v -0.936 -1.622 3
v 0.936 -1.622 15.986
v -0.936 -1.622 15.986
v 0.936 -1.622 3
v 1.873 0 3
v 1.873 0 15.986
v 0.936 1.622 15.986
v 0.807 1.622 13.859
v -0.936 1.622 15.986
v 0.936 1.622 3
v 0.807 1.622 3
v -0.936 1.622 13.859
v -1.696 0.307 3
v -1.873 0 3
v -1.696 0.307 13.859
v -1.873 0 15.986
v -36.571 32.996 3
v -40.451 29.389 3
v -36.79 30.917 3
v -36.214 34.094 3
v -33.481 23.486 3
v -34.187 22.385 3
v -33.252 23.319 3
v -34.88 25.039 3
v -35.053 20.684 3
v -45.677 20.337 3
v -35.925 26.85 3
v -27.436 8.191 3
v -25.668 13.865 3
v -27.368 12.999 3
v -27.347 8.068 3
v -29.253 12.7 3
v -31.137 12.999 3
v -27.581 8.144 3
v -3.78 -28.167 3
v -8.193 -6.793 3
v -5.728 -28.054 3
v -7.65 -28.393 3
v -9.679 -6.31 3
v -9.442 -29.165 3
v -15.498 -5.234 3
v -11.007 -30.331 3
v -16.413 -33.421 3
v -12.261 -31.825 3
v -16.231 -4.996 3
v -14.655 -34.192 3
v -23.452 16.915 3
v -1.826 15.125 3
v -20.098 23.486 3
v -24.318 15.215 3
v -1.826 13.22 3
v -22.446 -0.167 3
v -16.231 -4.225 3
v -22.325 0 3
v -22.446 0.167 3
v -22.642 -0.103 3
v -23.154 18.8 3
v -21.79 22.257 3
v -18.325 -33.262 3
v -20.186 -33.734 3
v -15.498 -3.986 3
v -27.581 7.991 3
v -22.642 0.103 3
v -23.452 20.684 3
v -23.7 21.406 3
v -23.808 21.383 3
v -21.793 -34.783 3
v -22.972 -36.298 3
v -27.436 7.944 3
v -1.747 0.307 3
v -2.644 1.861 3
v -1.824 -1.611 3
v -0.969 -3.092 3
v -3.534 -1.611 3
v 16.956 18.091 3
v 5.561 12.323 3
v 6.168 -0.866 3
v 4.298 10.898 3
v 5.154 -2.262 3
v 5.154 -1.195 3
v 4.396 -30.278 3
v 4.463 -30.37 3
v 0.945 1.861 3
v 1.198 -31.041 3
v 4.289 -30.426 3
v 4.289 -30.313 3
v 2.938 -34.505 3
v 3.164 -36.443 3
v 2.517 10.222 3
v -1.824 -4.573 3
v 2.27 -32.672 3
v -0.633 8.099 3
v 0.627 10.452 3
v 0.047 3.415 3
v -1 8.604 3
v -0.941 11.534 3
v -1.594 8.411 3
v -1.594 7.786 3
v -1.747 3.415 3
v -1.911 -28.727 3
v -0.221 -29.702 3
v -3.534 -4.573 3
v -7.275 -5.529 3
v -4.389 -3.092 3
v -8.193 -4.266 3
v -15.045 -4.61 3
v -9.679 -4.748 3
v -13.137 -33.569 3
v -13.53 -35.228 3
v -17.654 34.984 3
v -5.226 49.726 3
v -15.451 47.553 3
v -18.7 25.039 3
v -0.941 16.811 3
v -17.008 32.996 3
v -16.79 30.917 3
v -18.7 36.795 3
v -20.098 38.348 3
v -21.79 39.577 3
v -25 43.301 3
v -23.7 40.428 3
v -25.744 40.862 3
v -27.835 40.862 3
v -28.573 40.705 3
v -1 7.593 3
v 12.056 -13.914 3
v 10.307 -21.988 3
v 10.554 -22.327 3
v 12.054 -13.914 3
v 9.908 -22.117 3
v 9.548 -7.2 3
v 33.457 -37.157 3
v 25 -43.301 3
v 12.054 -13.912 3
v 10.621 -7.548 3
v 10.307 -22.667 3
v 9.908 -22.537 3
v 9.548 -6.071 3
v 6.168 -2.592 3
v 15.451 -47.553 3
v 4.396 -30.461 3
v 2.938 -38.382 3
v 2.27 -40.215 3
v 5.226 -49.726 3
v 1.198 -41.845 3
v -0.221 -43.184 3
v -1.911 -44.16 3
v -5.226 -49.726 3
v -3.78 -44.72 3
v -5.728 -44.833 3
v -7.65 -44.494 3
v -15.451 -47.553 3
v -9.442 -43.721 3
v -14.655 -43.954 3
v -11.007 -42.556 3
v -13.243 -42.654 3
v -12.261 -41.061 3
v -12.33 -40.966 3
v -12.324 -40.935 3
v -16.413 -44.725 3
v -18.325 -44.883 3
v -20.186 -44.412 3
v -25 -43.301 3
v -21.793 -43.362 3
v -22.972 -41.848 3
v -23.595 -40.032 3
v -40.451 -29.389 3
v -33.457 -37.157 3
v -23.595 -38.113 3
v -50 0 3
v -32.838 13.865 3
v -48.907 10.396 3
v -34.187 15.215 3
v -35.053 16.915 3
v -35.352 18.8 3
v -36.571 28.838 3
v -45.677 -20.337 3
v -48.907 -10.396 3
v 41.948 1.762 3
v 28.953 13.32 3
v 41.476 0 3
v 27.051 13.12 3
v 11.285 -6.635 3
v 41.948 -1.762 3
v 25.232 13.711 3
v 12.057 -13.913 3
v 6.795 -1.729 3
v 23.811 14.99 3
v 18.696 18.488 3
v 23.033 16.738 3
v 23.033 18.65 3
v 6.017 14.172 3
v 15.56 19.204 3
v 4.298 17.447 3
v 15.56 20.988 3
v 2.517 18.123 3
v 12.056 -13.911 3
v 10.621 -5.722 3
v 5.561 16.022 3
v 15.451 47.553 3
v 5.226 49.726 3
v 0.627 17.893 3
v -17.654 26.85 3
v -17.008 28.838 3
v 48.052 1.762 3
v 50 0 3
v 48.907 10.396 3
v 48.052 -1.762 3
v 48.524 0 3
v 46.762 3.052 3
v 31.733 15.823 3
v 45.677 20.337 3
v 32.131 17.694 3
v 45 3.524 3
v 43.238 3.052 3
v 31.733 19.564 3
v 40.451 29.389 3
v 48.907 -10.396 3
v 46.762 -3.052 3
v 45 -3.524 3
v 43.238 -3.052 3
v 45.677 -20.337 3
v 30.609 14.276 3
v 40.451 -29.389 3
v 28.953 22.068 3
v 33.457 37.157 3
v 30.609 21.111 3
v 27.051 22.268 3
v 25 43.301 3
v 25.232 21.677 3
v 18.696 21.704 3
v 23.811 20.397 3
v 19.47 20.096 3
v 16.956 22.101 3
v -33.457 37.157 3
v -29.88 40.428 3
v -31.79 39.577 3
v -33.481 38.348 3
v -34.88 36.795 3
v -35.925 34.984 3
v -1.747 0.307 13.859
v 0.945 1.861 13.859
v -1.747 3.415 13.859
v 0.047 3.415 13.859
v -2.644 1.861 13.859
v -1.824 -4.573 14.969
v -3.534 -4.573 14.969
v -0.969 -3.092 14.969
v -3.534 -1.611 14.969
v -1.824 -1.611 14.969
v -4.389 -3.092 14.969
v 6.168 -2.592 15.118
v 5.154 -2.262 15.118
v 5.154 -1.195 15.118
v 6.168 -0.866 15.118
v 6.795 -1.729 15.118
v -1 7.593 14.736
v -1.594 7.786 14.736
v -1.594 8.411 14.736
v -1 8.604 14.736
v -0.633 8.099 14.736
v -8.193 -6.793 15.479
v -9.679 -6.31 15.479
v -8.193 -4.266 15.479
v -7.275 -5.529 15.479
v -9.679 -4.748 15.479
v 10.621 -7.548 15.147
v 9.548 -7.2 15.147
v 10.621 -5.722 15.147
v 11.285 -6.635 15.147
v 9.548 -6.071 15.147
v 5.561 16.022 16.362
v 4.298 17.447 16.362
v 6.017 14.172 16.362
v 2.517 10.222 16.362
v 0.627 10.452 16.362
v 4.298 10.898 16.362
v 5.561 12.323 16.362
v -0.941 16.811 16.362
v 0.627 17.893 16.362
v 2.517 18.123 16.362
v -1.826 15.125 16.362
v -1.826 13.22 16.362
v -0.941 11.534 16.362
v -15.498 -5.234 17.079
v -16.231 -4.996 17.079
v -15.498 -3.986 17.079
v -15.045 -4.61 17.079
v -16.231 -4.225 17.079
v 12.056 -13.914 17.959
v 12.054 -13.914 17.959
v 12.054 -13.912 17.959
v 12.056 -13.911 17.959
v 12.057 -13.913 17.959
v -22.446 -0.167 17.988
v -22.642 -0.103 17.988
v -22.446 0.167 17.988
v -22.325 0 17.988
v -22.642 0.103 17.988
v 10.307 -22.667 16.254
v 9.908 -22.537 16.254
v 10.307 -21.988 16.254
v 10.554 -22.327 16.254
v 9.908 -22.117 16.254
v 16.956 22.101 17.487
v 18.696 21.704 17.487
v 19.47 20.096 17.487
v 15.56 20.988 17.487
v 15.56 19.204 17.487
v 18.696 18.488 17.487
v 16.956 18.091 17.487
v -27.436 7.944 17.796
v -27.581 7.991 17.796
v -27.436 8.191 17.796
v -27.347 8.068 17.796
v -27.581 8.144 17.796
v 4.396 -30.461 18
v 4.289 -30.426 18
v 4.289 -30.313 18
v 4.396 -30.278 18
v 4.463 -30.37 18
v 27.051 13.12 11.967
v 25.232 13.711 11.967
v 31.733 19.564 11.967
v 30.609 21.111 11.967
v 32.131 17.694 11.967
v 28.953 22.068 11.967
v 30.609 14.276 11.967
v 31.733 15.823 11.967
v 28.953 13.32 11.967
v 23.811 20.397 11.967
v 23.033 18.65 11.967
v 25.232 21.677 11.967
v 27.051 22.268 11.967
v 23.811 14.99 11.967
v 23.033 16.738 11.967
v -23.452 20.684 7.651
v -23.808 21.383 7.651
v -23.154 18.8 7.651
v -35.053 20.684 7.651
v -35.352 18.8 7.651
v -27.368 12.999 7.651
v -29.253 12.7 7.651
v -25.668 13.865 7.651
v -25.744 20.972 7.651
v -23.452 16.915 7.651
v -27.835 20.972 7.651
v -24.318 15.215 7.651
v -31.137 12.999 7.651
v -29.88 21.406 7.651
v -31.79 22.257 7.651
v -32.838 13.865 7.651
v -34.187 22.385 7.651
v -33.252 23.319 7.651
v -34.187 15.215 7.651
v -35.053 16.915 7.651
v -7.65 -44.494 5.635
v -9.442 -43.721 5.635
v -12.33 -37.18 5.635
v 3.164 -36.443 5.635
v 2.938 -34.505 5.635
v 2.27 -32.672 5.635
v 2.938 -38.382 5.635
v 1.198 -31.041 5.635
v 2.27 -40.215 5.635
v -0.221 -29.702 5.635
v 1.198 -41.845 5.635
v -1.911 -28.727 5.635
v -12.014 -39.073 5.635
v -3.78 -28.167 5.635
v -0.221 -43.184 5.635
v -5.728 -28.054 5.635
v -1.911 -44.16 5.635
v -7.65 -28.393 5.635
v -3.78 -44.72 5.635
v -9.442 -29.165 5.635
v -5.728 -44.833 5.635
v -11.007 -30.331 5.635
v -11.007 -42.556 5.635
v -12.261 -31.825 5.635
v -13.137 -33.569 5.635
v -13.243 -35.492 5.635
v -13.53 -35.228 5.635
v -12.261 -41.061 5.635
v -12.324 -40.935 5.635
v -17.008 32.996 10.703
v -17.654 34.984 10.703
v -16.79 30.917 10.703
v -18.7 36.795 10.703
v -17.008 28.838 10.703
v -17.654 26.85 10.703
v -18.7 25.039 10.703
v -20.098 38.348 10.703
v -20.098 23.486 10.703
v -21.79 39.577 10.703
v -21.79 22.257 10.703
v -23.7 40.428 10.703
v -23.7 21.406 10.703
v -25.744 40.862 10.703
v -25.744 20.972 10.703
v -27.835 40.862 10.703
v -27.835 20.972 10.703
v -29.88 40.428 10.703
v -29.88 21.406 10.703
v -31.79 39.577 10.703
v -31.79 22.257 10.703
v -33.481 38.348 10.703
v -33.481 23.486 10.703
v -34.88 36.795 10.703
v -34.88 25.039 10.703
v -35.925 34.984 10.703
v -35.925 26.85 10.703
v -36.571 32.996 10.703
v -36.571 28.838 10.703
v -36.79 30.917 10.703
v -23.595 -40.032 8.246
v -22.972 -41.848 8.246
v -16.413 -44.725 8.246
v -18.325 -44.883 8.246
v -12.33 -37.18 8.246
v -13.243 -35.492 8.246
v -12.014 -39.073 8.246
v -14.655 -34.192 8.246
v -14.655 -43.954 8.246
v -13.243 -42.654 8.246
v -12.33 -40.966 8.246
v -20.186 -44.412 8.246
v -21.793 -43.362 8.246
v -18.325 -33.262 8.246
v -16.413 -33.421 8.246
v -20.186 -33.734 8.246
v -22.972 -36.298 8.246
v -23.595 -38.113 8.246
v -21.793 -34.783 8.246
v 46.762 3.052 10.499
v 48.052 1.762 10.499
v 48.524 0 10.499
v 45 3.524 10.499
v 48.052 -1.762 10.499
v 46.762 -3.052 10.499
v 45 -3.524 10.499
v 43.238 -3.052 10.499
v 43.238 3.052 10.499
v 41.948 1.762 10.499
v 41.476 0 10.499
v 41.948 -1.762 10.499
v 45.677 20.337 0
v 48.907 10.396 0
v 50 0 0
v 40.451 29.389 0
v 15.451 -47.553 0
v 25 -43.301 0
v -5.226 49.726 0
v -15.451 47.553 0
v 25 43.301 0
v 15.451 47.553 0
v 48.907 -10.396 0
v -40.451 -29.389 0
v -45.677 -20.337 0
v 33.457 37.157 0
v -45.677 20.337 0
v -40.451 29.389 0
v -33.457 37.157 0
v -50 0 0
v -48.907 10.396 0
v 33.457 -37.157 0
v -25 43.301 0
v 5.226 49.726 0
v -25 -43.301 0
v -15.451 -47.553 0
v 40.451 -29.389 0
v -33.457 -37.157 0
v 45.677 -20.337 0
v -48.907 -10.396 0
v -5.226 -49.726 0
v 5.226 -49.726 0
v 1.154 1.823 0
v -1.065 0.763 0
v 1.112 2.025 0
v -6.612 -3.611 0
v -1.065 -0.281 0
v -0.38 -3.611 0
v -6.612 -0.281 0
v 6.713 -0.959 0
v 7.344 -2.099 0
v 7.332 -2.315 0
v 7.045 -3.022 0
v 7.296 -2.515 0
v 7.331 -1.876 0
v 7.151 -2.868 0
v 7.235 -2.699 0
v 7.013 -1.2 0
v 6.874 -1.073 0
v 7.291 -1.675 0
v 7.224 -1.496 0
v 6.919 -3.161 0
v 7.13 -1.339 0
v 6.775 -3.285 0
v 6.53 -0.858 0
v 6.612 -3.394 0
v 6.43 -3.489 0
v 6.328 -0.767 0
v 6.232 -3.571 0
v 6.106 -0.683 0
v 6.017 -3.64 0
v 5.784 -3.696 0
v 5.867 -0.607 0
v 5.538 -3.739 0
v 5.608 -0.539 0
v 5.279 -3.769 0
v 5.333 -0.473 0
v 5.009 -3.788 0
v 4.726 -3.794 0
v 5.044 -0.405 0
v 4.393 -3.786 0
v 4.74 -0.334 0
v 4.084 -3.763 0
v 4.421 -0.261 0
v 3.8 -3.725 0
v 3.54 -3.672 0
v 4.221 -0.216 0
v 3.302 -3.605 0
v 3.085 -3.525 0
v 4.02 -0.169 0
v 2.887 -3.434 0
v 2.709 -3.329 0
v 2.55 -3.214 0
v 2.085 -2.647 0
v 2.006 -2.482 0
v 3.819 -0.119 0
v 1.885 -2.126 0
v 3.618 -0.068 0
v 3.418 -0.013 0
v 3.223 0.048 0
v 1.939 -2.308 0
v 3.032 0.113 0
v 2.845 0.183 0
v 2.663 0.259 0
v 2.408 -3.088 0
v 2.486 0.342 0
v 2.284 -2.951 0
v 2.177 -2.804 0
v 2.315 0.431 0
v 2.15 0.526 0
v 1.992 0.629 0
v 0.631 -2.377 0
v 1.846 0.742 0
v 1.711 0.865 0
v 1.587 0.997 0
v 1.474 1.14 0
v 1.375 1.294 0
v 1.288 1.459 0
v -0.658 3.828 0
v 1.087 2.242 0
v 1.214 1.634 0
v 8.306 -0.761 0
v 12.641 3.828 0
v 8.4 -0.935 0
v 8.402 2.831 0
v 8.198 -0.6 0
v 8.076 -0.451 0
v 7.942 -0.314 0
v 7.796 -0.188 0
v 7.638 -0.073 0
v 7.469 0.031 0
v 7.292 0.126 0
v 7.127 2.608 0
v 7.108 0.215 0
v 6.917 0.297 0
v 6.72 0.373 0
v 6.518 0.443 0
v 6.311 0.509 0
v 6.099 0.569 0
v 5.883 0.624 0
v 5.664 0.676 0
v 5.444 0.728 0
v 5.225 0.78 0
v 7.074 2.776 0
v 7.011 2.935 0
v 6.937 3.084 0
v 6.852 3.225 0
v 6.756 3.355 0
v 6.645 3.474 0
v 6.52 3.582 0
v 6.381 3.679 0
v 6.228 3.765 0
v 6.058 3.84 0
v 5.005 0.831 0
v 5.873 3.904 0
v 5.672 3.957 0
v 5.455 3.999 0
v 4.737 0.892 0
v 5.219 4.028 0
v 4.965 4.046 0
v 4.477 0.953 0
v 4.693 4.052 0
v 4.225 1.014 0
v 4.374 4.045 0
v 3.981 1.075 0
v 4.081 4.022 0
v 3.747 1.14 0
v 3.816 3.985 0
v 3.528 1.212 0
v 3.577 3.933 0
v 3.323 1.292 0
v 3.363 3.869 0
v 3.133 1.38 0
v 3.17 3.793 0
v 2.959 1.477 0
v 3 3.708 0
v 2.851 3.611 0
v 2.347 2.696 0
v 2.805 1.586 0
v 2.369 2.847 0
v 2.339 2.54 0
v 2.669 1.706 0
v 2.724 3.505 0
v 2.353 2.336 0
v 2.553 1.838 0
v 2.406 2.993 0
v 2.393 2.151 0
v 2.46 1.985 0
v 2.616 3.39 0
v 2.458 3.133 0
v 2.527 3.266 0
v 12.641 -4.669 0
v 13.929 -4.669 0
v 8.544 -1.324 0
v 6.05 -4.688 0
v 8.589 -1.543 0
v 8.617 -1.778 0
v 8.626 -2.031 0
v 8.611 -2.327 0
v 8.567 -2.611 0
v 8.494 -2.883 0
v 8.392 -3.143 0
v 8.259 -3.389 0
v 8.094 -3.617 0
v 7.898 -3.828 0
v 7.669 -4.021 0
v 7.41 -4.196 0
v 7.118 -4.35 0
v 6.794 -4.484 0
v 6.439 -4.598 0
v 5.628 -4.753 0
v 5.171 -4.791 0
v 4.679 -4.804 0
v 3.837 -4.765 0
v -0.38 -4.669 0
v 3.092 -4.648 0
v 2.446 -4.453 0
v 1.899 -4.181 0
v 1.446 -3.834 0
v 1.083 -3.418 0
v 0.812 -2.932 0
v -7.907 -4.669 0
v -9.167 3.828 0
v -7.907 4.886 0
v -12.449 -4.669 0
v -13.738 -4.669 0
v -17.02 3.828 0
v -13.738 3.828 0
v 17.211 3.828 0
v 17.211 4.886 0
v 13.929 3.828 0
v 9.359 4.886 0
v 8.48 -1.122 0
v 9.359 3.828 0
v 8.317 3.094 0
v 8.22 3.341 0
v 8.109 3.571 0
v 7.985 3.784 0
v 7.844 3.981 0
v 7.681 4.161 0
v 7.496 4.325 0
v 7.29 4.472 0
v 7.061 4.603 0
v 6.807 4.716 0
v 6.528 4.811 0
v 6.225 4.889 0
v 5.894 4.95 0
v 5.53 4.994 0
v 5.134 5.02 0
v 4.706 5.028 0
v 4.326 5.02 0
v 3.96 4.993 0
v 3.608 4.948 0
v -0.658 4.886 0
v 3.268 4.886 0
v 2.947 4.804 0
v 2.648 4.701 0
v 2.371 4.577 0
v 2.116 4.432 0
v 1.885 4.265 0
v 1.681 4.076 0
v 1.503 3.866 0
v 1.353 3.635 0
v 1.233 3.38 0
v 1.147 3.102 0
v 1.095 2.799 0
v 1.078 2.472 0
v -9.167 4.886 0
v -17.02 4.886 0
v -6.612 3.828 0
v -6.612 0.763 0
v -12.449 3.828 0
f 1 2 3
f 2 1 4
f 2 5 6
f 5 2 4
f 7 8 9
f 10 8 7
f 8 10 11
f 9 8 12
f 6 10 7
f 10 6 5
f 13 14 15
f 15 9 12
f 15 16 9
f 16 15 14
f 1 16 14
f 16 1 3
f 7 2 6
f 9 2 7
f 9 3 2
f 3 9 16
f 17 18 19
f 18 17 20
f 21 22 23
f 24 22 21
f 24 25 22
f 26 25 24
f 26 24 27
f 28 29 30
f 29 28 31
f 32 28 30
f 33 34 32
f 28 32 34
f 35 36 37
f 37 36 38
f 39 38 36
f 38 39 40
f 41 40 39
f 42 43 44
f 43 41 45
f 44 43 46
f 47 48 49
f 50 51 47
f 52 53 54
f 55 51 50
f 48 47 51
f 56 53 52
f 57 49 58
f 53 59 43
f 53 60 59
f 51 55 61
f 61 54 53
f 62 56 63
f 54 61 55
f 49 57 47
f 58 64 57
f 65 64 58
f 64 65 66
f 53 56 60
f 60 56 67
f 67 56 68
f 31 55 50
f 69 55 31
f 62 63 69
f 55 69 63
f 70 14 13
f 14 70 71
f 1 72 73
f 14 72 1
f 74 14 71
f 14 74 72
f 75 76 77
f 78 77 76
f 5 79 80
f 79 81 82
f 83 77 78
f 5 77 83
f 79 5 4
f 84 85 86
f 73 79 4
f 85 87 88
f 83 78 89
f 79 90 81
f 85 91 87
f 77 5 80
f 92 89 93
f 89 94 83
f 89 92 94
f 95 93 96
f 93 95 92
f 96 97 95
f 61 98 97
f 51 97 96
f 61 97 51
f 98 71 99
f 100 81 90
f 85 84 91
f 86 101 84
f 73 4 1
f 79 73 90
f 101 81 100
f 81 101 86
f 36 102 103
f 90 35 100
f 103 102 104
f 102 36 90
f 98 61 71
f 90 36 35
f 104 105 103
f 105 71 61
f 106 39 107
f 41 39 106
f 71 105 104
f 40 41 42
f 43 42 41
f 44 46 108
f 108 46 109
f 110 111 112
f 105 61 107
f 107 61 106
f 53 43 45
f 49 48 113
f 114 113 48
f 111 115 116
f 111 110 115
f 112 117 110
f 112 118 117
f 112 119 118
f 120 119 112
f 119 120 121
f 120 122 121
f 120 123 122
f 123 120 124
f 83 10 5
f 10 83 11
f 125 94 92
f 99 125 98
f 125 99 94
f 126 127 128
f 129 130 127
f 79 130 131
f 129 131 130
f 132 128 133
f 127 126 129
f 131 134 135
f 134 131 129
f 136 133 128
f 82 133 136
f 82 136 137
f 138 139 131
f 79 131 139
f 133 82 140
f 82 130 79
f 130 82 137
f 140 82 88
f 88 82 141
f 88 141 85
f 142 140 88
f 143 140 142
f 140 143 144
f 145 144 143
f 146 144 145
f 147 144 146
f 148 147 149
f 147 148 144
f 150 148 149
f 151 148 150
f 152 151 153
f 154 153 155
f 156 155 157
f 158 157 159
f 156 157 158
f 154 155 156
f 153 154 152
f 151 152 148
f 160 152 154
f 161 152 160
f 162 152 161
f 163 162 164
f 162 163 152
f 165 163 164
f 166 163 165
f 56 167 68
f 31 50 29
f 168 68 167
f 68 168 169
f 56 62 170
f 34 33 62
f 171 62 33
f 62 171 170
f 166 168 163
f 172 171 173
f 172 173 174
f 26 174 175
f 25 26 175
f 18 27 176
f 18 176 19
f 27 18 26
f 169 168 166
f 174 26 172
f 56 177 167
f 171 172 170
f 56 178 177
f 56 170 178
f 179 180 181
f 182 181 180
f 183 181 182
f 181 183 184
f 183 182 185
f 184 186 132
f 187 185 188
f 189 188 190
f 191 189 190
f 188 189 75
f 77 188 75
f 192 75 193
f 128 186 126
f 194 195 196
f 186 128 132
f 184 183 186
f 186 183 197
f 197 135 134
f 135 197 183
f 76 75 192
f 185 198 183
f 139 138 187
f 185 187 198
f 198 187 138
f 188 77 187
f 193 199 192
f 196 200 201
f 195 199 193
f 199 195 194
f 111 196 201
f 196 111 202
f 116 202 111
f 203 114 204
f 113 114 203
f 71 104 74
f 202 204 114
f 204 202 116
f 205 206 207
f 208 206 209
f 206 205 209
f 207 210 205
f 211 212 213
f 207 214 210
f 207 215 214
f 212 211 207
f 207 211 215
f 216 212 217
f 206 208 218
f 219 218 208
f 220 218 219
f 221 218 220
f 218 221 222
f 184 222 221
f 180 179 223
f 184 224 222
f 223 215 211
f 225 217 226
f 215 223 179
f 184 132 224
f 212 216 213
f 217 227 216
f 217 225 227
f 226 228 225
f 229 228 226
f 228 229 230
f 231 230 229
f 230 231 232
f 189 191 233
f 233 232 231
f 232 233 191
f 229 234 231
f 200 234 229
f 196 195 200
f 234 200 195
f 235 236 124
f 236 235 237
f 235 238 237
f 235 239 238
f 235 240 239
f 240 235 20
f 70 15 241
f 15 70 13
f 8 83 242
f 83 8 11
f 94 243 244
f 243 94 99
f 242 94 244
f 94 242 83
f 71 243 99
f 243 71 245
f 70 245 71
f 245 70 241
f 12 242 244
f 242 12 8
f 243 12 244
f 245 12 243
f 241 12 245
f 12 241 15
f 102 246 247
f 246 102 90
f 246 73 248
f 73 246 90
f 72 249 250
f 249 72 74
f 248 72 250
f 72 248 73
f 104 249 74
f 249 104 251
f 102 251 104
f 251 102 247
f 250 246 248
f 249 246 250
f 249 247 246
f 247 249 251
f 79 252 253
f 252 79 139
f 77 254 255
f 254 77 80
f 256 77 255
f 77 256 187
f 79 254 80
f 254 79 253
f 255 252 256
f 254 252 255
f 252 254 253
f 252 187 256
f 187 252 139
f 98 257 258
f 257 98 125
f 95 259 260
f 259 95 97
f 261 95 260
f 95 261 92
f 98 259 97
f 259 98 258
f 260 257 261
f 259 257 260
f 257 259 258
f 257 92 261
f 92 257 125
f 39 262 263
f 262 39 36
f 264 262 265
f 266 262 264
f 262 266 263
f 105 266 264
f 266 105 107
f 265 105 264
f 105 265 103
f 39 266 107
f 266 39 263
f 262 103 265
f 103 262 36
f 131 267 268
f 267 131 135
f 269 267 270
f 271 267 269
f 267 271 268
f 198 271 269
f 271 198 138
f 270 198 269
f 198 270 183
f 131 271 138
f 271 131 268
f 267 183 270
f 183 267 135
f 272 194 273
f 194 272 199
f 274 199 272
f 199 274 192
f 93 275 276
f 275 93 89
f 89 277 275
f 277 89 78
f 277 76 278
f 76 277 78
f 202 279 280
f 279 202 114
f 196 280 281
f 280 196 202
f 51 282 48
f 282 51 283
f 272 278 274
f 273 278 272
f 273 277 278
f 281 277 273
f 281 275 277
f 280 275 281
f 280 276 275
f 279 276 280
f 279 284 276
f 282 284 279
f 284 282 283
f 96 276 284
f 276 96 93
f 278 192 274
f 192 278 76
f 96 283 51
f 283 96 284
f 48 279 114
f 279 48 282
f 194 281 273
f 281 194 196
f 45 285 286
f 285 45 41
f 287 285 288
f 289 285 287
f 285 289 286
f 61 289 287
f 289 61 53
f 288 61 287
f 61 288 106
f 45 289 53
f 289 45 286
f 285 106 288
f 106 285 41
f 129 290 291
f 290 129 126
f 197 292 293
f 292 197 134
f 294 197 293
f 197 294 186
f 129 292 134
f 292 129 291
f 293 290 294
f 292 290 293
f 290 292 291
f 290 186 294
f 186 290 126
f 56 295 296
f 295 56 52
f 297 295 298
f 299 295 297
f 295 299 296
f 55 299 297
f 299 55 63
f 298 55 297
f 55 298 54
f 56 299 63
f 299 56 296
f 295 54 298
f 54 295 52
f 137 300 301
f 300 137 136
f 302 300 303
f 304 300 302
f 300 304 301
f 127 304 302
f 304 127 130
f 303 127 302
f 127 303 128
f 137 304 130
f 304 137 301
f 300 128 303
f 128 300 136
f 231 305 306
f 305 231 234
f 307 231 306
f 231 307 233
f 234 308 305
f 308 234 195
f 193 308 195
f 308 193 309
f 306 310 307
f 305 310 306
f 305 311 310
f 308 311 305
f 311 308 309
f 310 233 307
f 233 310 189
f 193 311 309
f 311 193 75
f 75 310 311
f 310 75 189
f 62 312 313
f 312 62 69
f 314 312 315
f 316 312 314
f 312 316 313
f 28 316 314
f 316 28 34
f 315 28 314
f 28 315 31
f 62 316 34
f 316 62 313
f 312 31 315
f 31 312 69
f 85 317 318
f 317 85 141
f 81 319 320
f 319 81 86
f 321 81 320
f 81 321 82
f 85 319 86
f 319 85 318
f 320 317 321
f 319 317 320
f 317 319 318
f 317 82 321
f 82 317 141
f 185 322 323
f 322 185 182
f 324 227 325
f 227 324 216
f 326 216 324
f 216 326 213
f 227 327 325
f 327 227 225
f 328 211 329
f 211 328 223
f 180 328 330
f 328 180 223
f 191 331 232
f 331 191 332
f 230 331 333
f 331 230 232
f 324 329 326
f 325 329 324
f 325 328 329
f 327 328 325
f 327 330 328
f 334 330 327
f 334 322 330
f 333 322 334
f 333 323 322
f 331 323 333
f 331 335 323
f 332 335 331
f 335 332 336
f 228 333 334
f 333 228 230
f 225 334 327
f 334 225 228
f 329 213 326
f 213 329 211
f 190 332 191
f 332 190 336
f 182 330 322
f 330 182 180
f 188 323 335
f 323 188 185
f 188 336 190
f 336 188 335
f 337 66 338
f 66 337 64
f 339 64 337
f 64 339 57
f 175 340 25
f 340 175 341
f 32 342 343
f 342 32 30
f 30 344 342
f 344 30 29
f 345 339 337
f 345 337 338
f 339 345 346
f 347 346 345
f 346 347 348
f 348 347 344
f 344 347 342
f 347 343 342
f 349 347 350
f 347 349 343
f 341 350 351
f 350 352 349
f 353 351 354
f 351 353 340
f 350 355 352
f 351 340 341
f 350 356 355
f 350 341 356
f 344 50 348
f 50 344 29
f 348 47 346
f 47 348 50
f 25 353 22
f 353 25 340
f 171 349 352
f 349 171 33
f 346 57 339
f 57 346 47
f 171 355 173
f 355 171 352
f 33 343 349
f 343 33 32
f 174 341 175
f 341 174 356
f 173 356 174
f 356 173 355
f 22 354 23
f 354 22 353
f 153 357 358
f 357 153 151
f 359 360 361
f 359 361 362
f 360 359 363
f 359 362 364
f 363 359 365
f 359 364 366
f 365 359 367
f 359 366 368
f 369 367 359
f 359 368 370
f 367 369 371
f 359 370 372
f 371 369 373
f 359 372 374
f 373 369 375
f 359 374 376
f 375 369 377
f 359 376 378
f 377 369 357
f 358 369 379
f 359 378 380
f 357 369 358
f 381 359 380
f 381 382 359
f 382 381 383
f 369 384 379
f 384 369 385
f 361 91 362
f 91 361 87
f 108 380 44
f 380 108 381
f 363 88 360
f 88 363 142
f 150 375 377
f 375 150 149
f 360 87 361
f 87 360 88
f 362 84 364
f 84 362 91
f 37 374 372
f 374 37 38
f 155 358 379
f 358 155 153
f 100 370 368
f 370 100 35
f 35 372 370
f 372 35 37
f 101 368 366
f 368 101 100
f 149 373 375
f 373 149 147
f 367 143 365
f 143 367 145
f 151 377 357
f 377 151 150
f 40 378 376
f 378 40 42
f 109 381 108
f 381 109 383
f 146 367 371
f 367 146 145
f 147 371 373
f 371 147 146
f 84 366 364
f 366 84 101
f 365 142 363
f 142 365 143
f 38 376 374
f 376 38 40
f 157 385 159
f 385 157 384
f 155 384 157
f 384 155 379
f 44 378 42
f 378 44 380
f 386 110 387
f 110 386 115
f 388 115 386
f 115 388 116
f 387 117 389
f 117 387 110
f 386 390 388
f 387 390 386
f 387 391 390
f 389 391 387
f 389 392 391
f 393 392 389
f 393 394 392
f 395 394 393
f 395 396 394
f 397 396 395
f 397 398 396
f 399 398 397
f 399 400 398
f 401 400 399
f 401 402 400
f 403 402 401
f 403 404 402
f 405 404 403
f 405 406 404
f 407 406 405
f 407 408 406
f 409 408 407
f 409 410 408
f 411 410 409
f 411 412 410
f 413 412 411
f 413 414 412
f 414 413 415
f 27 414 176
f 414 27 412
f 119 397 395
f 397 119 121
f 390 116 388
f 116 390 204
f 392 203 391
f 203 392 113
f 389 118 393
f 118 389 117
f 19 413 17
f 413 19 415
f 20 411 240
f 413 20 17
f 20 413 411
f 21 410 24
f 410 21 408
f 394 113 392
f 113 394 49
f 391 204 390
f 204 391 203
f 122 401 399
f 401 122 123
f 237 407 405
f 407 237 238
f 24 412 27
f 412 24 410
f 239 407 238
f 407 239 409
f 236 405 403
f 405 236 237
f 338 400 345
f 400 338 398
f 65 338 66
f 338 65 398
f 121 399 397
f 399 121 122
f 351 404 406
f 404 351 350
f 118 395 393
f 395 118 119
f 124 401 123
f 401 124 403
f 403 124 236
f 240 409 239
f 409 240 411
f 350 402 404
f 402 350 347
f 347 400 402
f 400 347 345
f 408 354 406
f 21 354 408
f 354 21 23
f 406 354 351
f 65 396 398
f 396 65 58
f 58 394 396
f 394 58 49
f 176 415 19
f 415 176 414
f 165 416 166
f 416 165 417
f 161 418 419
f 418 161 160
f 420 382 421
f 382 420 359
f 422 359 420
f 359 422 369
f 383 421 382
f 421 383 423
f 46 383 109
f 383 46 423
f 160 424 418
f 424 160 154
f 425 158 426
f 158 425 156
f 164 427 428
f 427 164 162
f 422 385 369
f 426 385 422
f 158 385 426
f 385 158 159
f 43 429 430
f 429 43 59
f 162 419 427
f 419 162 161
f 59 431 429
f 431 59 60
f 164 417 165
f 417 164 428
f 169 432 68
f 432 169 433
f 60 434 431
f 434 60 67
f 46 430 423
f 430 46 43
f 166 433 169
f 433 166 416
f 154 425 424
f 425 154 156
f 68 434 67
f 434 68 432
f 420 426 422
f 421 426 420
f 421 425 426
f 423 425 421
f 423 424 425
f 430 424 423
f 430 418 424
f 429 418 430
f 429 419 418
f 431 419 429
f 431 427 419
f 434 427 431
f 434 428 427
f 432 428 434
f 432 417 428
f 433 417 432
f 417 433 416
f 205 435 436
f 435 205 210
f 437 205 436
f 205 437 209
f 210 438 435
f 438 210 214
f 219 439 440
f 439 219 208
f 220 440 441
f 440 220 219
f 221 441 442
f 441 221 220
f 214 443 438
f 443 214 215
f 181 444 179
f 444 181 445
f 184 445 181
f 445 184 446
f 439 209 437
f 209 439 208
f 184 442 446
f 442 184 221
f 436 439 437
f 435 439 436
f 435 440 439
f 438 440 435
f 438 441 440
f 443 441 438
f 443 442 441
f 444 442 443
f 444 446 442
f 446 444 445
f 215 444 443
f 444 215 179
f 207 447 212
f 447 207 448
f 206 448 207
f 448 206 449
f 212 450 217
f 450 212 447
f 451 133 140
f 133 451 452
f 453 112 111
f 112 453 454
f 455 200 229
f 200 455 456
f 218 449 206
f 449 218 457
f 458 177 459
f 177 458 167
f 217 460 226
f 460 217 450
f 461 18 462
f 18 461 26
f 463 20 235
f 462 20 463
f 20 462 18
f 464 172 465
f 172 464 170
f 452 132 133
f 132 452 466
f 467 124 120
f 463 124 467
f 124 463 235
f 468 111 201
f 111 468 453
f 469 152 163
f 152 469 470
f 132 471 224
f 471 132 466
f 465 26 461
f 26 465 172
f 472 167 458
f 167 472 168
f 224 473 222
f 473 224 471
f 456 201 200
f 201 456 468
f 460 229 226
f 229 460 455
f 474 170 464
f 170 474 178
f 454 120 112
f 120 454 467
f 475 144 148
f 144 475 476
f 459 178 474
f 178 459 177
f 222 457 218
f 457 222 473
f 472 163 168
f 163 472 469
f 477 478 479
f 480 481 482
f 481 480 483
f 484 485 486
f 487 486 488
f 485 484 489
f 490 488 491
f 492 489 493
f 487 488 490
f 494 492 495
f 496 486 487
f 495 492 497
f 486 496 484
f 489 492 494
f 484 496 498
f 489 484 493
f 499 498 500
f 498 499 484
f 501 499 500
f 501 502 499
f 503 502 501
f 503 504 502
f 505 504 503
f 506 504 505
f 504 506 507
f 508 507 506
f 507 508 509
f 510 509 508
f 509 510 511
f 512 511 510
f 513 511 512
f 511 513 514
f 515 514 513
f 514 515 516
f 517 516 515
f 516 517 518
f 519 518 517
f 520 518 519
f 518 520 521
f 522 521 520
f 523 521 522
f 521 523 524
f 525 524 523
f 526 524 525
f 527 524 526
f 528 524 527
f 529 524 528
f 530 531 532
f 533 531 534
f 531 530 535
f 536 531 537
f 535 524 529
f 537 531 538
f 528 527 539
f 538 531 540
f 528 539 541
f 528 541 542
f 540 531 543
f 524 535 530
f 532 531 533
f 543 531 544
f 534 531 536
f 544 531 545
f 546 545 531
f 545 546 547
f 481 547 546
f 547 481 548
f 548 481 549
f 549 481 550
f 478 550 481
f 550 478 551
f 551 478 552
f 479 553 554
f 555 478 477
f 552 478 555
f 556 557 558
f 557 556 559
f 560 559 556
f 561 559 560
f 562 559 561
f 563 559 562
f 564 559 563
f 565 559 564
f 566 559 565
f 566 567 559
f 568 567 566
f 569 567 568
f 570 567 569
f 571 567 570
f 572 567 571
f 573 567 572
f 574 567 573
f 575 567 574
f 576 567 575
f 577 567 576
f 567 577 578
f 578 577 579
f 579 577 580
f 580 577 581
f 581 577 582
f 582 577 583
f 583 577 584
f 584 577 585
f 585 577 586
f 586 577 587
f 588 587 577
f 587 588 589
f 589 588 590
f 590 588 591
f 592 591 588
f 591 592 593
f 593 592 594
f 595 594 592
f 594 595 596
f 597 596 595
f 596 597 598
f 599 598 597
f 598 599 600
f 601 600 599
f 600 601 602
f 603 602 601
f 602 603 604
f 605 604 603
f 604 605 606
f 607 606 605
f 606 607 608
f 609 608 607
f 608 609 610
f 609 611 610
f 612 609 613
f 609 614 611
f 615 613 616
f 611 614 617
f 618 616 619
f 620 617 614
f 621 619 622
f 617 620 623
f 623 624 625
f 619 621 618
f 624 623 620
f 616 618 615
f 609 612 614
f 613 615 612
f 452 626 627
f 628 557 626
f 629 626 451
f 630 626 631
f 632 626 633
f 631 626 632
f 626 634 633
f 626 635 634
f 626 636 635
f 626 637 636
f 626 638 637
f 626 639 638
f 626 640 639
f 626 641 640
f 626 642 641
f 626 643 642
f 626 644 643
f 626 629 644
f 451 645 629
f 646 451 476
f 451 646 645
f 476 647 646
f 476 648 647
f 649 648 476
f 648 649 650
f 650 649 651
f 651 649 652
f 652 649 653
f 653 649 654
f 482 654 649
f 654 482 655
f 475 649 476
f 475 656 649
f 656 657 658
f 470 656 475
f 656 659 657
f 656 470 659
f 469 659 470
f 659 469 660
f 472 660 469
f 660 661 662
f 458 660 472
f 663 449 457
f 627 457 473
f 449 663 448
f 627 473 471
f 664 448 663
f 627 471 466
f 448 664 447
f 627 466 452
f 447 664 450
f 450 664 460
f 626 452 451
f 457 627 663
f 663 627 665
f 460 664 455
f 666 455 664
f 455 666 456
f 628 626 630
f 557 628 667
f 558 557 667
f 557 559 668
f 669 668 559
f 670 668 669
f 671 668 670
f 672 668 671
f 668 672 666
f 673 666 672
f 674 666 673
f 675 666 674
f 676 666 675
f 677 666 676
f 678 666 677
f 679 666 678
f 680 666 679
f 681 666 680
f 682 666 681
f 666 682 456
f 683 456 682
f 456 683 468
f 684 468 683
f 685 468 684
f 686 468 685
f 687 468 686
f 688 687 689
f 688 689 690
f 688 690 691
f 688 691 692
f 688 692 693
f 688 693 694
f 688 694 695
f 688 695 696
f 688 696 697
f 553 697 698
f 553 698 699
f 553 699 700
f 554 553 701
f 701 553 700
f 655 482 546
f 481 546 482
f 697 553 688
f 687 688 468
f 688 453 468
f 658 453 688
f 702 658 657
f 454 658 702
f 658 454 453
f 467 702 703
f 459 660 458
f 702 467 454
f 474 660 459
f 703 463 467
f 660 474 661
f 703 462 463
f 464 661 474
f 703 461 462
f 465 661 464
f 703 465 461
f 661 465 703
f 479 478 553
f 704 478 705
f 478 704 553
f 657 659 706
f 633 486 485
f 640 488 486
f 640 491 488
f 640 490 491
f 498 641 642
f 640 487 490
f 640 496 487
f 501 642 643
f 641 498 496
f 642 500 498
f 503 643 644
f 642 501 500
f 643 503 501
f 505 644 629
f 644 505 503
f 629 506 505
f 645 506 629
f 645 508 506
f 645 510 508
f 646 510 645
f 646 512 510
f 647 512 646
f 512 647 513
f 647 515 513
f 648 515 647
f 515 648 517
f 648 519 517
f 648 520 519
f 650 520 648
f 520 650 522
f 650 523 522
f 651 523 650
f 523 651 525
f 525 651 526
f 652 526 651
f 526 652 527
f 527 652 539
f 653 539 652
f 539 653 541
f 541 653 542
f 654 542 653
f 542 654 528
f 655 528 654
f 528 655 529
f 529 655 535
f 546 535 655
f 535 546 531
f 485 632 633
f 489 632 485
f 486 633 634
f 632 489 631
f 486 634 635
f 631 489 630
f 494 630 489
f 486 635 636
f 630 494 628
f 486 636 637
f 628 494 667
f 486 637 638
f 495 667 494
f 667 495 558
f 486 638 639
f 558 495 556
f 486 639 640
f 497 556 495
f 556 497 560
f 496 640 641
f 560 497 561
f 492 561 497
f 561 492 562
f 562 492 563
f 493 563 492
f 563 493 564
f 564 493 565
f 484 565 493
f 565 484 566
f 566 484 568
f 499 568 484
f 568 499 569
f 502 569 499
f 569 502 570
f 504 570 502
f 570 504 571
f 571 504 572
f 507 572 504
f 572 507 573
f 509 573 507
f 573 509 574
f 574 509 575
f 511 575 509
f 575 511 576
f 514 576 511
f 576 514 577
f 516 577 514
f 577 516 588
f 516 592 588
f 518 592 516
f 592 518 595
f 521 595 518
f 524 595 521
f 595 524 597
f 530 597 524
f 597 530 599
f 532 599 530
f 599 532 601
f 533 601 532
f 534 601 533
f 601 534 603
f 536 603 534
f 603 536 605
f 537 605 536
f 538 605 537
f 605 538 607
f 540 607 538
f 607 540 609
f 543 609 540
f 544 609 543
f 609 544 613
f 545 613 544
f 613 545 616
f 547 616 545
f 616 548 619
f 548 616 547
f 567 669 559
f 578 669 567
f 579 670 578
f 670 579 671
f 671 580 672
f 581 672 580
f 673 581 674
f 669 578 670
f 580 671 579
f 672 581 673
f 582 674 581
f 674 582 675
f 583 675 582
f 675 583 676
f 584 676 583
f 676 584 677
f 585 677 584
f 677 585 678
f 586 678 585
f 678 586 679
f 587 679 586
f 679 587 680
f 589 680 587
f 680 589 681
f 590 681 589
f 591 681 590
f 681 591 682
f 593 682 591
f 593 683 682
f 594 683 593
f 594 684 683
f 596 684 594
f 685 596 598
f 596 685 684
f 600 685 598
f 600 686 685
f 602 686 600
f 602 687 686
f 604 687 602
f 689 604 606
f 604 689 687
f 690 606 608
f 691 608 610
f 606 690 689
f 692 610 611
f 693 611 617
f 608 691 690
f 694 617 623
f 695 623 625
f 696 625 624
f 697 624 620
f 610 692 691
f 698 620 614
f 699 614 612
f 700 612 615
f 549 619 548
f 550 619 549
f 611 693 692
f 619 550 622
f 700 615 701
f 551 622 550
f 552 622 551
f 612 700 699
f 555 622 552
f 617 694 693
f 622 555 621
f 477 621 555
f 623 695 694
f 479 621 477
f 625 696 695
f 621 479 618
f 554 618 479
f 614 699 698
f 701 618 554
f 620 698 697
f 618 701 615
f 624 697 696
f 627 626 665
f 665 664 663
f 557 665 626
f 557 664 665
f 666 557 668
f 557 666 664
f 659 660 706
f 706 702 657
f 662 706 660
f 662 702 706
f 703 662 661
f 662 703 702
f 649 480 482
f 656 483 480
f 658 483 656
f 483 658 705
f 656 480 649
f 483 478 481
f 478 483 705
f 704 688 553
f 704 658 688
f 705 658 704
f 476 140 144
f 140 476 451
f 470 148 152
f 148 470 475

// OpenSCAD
// Generated by SolidPython 1.1.3 on 2025-04-12 11:14:56


difference() {
	union() {
		cylinder(center = false, h = 3, r = 50);
		union() {
			translate(v = [0.0, 0.0, 3]) {
				cylinder(center = false, h = 12.986204537140186, r = 1.872969883238689);
			}
			translate(v = [-0.8497125265947675, 1.8606108995887878, 3]) {
				cylinder(center = false, h = 10.858750813041151, r = 1.7943197416390873);
			}
			translate(v = [-2.678975729776167, -3.0917028041765104, 3]) {
				cylinder(center = false, h = 11.969110069021792, r = 1.7102337227155642);
			}
			translate(v = [5.887797792634416, -1.7288134169815006, 3]) {
				cylinder(center = false, h = 12.117738734673768, r = 0.9075780798747147);
			}
			translate(v = [-1.1643941313268753, 8.098539069934905, 3]) {
				cylinder(center = false, h = 11.73596366350858, r = 0.5313353316018563);
			}
			translate(v = [-8.603729313046175, -5.52928108761406, 3]) {
				cylinder(center = false, h = 12.479115885564132, r = 1.3285751064831675);
			}
			translate(v = [10.324475175655405, -6.6351373051368805, 3]) {
				cylinder(center = false, h = 12.146883702949589, r = 0.9602360571414088);
			}
			translate(v = [2.0376897298220564, 14.17244337238608, 3]) {
				cylinder(center = false, h = 13.36215417216846, r = 3.9793089832708373);
			}
			translate(v = [-15.700794113691778, -4.610169111950656, 3]) {
				cylinder(center = false, h = 14.079074144016632, r = 0.655866945730602);
			}
			translate(v = [12.05539078399272, -13.912662618794325, 3]) {
				cylinder(center = false, h = 14.959199712552525, r = 0.001834191735065344);
			}
			translate(v = [8.497125265947703, 18.606108995887862, 3]) {
				cylinder(center = false, h = 14.312220549529846, r = 0.0);
			}
			translate(v = [-22.5, 1.928818708657081e-14, 3]) {
				cylinder(center = false, h = 14.988344680828348, r = 0.17532872050786436);
			}
			translate(v = [10.196550319137206, -22.327330795065453, 3]) {
				cylinder(center = false, h = 13.254321347066153, r = 0.357000409524991);
			}
			translate(v = [17.413342243545074, 20.096068227147327, 3]) {
				cylinder(center = false, h = 14.4870814653892, r = 2.0565091129315185);
			}
			translate(v = [-27.476389698960585, 8.067795945913742, 3]) {
				cylinder(center = false, h = 14.795998562762627, r = 0.1298340956901163);
			}
			translate(v = [4.366477992475729, -30.369521512255897, 3]) {
				cylinder(center = false, h = 15.0, r = 0.0960316094598939);
			}
			translate(v = [27.531933801747773, 17.693699480364966, 3]) {
				cylinder(center = false, h = 8.967360659421583, r = 4.599012337774078);
			}
			translate(v = [-29.252679664356965, 18.799555697887854, 3]) {
				cylinder(center = false, h = 4.65125500350119, r = 6.099174413625576);
			}
			translate(v = [-5.239773590971098, -36.44342581470705, 3]) {
				cylinder(center = false, h = 2.634546822572928, r = 8.403946380239285);
			}
			translate(v = [37.289386020017965, 10.94915164088284, 3]) {
				cylinder(center = false, h = 0.0, r = 5.762256736152519);
			}
			translate(v = [-26.78975729776157, 30.917028041765185, 3]) {
				cylinder(center = false, h = 7.702547301652045, r = 10.0);
			}
			translate(v = [-17.843963058490072, -39.07282889136456, 3]) {
				cylinder(center = false, h = 5.245774113006939, r = 5.830321923993762);
			}
			translate(v = [45.0, -7.715274834628324e-14, 3]) {
				cylinder(center = false, h = 7.498541417516872, r = 3.5239091895006864);
			}
		}
	}
	translate(v = [0, 0, -2]) {
		linear_extrude(height = 2) {
			text(halign = "center", size = 10, text = "TEST", valign = "center");
		}
	}
}
/***********************************************
*********      SolidPython code:      **********
************************************************
 
#!/usr/bin/env python3
"""
Improved 3D Model Generation Module for Crazy Stock Badges Project

This module provides classes and functions for generating 3D models from stock data
using SolidPython to create OpenSCAD files that can be rendered to STL for 3D printing.
"""

import os
import numpy as np
import pandas as pd
from solid import *
from solid.utils import *
import logging
from abc import ABC, abstractmethod
from pathlib import Path
import math

# Configure logging
logging.basicConfig(
    level=logging.INFO,
    format='%(asctime)s - %(name)s - %(levelname)s - %(message)s'
)
logger = logging.getLogger('improved_3d_models')


class StockDataValidator:
    """Validates and preprocesses stock data for 3D model generation."""
    
    @staticmethod
    def validate_data(data):
        """
        Validate that the data contains the required columns.
        
        Args:
            data (pandas.DataFrame): Stock data
            
        Returns:
            bool: True if data is valid, False otherwise
        """
        required_columns = ['Close', 'Volume']
        
        if not isinstance(data, pd.DataFrame):
            logger.error("Data must be a pandas DataFrame")
            return False
        
        for col in required_columns:
            if col not in data.columns:
                logger.error(f"Required column '{col}' not found in data")
                return False
        
        if len(data) < 5:
            logger.error("Data must contain at least 5 rows")
            return False
            
        return True
    
    @staticmethod
    def normalize_data(data, columns=None, new_min=0, new_max=10):
        """
        Normalize specified columns to a new range.
        
        Args:
            data (pandas.DataFrame): Stock data
            columns (list): List of columns to normalize
            new_min (float): Minimum value for normalized data
            new_max (float): Maximum value for normalized data
            
        Returns:
            pandas.DataFrame: Data with normalized columns added
        """
        if columns is None:
            columns = ['Close', 'Volume']
        
        result = data.copy()
        
        for col in columns:
            if col in data.columns:
                norm_col = f'{col}_Normalized'
                min_val = data[col].min()
                max_val = data[col].max()
                
                # Avoid division by zero
                if max_val == min_val:
                    result[norm_col] = new_min
                else:
                    result[norm_col] = (data[col] - min_val) / (max_val - min_val) * (new_max - new_min) + new_min
            else:
                logger.warning(f"Column '{col}' not found in data, skipping normalization")
        
        return result


class Badge3DModel(ABC):
    """Abstract base class for 3D badge models."""
    
    def __init__(self, stock_data, ticker_symbol, params=None):
        """
        Initialize the 3D model.
        
        Args:
            stock_data (pandas.DataFrame): Stock data
            ticker_symbol (str): Stock ticker symbol
            params (dict): Additional parameters for the model
        """
        self.ticker_symbol = ticker_symbol
        self.params = params or {}
        
        # Validate and normalize data
        validator = StockDataValidator()
        if not validator.validate_data(stock_data):
            raise ValueError("Invalid stock data")
        
        # Set default normalization ranges
        height_range = self.params.get('height_range', (0, 15))
        width_range = self.params.get('width_range', (0, 10))
        
        # Normalize data
        self.data = validator.normalize_data(
            stock_data, 
            columns=['Close', 'Volume', 'High', 'Low'],
            new_min=height_range[0],
            new_max=height_range[1]
        )
        
        # Normalize volume separately for width
        self.data['Volume_Width'] = validator.normalize_data(
            stock_data, 
            columns=['Volume'],
            new_min=width_range[0],
            new_max=width_range[1]
        )['Volume_Normalized']
        
        # Initialize model components
        self.base_model = None
        self.feature_model = None
        self.text_model = None
        self.final_model = None
        
        # Model statistics
        self.stats = {
            'num_objects': 0,
            'height_diff': 0,
            'width_diff': 0,
            'depth_diff': 0,
            'size': (0, 0, 0)
        }
    
    @abstractmethod
    def generate_base(self):
        """Generate the base part of the model."""
        pass
    
    @abstractmethod
    def generate_feature(self):
        """Generate the feature part of the model based on stock data."""
        pass
    
    @abstractmethod
    def generate_text(self):
        """Generate text elements for the model."""
        pass
    
    def combine_models(self):
        """
        Combine base, feature, and text models into the final model.
        
        Returns:
            solid.OpenSCADObject: Combined 3D model
        """
        if self.base_model is None:
            self.generate_base()
        
        if self.feature_model is None:
            self.generate_feature()
        
        if self.text_model is None:
            self.generate_text()
        
        # Combine models
        combined = union()(
            self.base_model,
            self.feature_model
        )
        
        # Apply text as a difference (engraving)
        if self.text_model is not None:
            self.final_model = difference()(
                combined,
                self.text_model
            )
        else:
            self.final_model = combined
        
        return self.final_model
    
    def calculate_stats(self):
        """
        Calculate statistics about the model.
        
        Returns:
            dict: Model statistics
        """
        # This is a placeholder - in a real implementation, we would
        # analyze the OpenSCAD model to extract these statistics
        self.stats['num_objects'] = len(self.data)
        self.stats['height_diff'] = self.params.get('height_range', (0, 15))[1]
        self.stats['width_diff'] = self.params.get('width_range', (0, 10))[1]
        self.stats['depth_diff'] = 5  # Example value
        self.stats['size'] = (100, 100, 20)  # Example values
        
        return self.stats
    
    def save_to_file(self, filename=None):
        """
        Save the model to an OpenSCAD file.
        
        Args:
            filename (str): Output filename
            
        Returns:
            str: Path to the saved file
        """
        if self.final_model is None:
            self.combine_models()
        
        if filename is None:
            filename = f"{self.ticker_symbol}_badge.scad"
        
        # Save the model
        scad_render_to_file(self.final_model, filename)
        logger.info(f"Model saved to {filename}")
        
        return filename


class DiscBadge(Badge3DModel):
    """Circular badge with stock data features."""
    
    def generate_base(self):
        """
        Generate a circular base for the badge.
        
        Returns:
            solid.OpenSCADObject: Base 3D model
        """
        radius = self.params.get('base_radius', 50)
        height = self.params.get('base_height', 3)
        
        self.base_model = cylinder(r=radius, h=height, center=False)
        return self.base_model
    
    def generate_feature(self):
        """
        Generate features on the badge based on stock data.
        
        Returns:
            solid.OpenSCADObject: Feature 3D model
        """
        feature_type = self.params.get('feature_type', 'jagged_edge')
        
        if feature_type == 'jagged_edge':
            self.feature_model = self._generate_jagged_edge()
        elif feature_type == 'spiral':
            self.feature_model = self._generate_spiral()
        else:
            logger.warning(f"Unknown feature type: {feature_type}, using jagged_edge")
            self.feature_model = self._generate_jagged_edge()
        
        return self.feature_model
    
    def _generate_jagged_edge(self):
        """
        Generate a jagged edge disc based on stock prices.
        
        Returns:
            solid.OpenSCADObject: Jagged edge 3D model
        """
        base_radius = self.params.get('base_radius', 50)
        height = self.params.get('feature_height', 2)
        z_offset = self.params.get('base_height', 3)
        
        # Parameters for the polygon
        num_points = len(self.data)  # Use all data points
        angles = np.linspace(0, 2 * np.pi, num_points)  # Angles around the circle
        
        # Map normalized stock prices to the polygon edge
        radii = self.data['Close_Normalized'] + base_radius
        
        # Create points for the polygon
        points = []
        for i in range(num_points):
            x = radii.iloc[i] * np.cos(angles[i])  # X coordinate
            y = radii.iloc[i] * np.sin(angles[i])  # Y coordinate
            points.append([x, y])
        
        # Create 2D polygon and extrude to 3D
        jagged_disc_2d = polygon(points)
        jagged_disc_3d = linear_extrude(height=height)(jagged_disc_2d)
        
        # Translate to sit on top of the base
        return translate([0, 0, z_offset])(jagged_disc_3d)
    
    def _generate_spiral(self):
        """
        Generate a spiral landscape based on stock data.
        
        Returns:
            solid.OpenSCADObject: Spiral landscape 3D model
        """
        radius = self.params.get('spiral_radius', 45)
        z_offset = self.params.get('base_height', 3)
        spiral_turns = self.params.get('spiral_turns', 7)
        
        # Generate points on a spiral
        num_points = len(self.data)
        angles = np.linspace(0, spiral_turns * 2 * np.pi, num_points)  # Spiral angles
        radii = np.linspace(0, radius, num_points)  # Gradually increase radius for spiral
        
        # Map normalized stock prices to heights and widths
        heights = self.data['Close_Normalized']
        widths = self.data['Volume_Width']
        
        # Calculate coordinates
        x = radii * np.cos(angles)  # X coordinates
        y = radii * np.sin(angles)  # Y coordinates
        
        # Create the landscape as a series of stacked cylinders
        landscape = []
        for i in range(num_points):
            cylinder_height = heights.iloc[i]
            cylinder_radius = widths.iloc[i]
            
            landscape.append(
                translate([x[i], y[i], z_offset])(
                    cylinder(r=cylinder_radius, h=cylinder_height, center=False)
                )
            )
        
        # Combine the landscape into a single object
        return union()(landscape)
    
    def generate_text(self):
        """
        Generate text for the badge.
        
        Returns:
            solid.OpenSCADObject: Text 3D model
        """
        text_depth = self.params.get('text_depth', 2)
        text_size = self.params.get('text_size', 10)
        text_content = self.params.get('text_content', self.ticker_symbol)
        text_position = self.params.get('text_position', 'bottom')
        
        # Create text object
        if len(text_content) > 10:
            # For longer text, use multiline
            self.text_model = self._generate_multiline_text(
                text_content, text_size, text_depth
            )
        else:
            # For shorter text, use single line
            text_2d = text(text_content, size=text_size, halign='center', valign='center')
            self.text_model = linear_extrude(height=text_depth)(text_2d)
        
        # Position the text
        if text_position == 'bottom':
            # Position text on the bottom of the badge (as an engraving)
            z_pos = -text_depth
            self.text_model = translate([0, 0, z_pos])(self.text_model)
        elif text_position == 'top':
            # Position text on the top of the badge
            base_height = self.params.get('base_height', 3)
            feature_height = self.params.get('feature_height', 2)
            z_pos = base_height + feature_height
            self.text_model = translate([0, 0, z_pos])(self.text_model)
        
        return self.text_model
    
    def _generate_multiline_text(self, text_content, size, depth, wrap_chars=10):
        """
        Generate multiline text object.
        
        Args:
            text_content (str): Text to display
            size (float): Text size
            depth (float): Text depth
            wrap_chars (int): Number of characters per line
            
        Returns:
            solid.OpenSCADObject: Multiline text 3D model
        """
        # Split text into lines
        lines = [text_content[i:i+wrap_chars] for i in range(0, len(text_content), wrap_chars)]
        num_lines = len(lines)
        
        # Generate 3D text objects for each line and center them
        text_objects = []
        line_spacing = size * 1.2  # Adjust spacing based on text size
        
        for i, line in enumerate(lines):
            y_offset = (num_lines - 1) / 2 - i  # Center the text block
            text_2d = text(line, size=size, halign='center', valign='center')
            text_3d = linear_extrude(height=depth)(text_2d)
            text_objects.append(translate([0, y_offset * line_spacing, 0])(text_3d))
        
        return union()(text_objects)


class RectangularBadge(Badge3DModel):
    """Rectangular badge with stock data features."""
    
    def generate_base(self):
        """
        Generate a rectangular base for the badge.
        
        Returns:
            solid.OpenSCADObject: Base 3D model
        """
        width = self.params.get('base_width', 100)
        depth = self.params.get('base_depth', 60)
        height = self.params.get('base_height', 3)
        
        self.base_model = cube([width, depth, height], center=False)
        return self.base_model
    
    def generate_feature(self):
        """
        Generate features on the badge based on stock data.
        
        Returns:
            solid.OpenSCADObject: Feature 3D model
        """
        feature_type = self.params.get('feature_type', 'bar_chart')
        
        if feature_type == 'bar_chart':
            self.feature_model = self._generate_bar_chart()
        elif feature_type == 'surface_plot':
            self.feature_model = self._generate_surface_plot()
        else:
            logger.warning(f"Unknown feature type: {feature_type}, using bar_chart")
            self.feature_model = self._generate_bar_chart()
        
        return self.feature_model
    
    def _generate_bar_chart(self):
        """
        Generate a bar chart based on stock prices.
        
        Returns:
            solid.OpenSCADObject: Bar chart 3D model
        """
        base_width = self.params.get('base_width', 100)
        base_depth = self.params.get('base_depth', 60)
        z_offset = self.params.get('base_height', 3)
        bar_width = base_width / len(self.data)
        
        # Create bars for each data point
        bars = []
        for i in range(len(self.data)):
            bar_height = self.data['Close_Normalized'].iloc[i]
            bar_depth = base_depth * 0.8  # Make bars slightly narrower than the base
            
            # Position each bar along the x-axis
            x_pos = i * bar_width
            y_pos = (base_depth - bar_depth) / 2  # Center bars on the y-axis
            
            bars.append(
                translate([x_pos, y_pos, z_offset])(
                    cube([bar_width * 0.9, bar_depth, bar_height])
                )
            )
        
        return union()(bars)
    
    def _generate_surface_plot(self):
        """
        Generate a surface plot based on stock data.
        
        Returns:
            solid.OpenSCADObject: Surface plot 3D model
        """
        base_width = self.params.get('base_width', 100)
        base_depth = self.params.get('base_depth', 60)
        z_offset = self.params.get('base_height', 3)
        
        # Create a grid of points
        grid_size = int(math.sqrt(len(self.data)))
        if grid_size < 2:
            grid_size = 2
        
        # Truncate data to fit grid
        data_points = min(grid_size * grid_size, len(self.data))
        heights = self.data['Close_Normalized'].iloc[:data_points].values
        
        # Reshape to grid
        try:
            height_grid = heights[:grid_size * grid_size].reshape(grid_size, grid_size)
        except ValueError:
            # If reshaping fails, pad with zeros
            padded = np.zeros(grid_size * grid_size)
            padded[:len(heights)] = heights
            height_grid = padded.reshape(grid_size, grid_size)
        
        # Calculate cell dimensions
        cell_width = base_width / grid_size
        cell_depth = base_depth / grid_size
        
        # Create cells for the surface
        cells = []
        for i in range(grid_size):
            for j in range(grid_size):
                cell_height = height_grid[i, j]
                
                x_pos = i * cell_width
                y_pos = j * cell_depth
                
                cells.append(
                    translate([x_pos, y_pos, z_offset])(
                        cube([cell_width * 0.95, cell_depth * 0.95, cell_height])
                    )
                )
        
        return union()(cells)
    
    def generate_text(self):
        """
        Generate text for the badge.
        
        Returns:
            solid.OpenSCADObject: Text 3D model
        """
        text_depth = self.params.get('text_depth', 2)
        text_size = self.params.get('text_size', 10)
        text_content = self.params.get('text_content', self.ticker_symbol)
        text_position = self.params.get('text_position', 'bottom')
        
        base_width = self.params.get('base_width', 100)
        base_depth = self.params.get('base_depth', 60)
        
        # Create text object
        text_2d = text(text_content, size=text_size, halign='center', valign='center')
        self.text_model = linear_extrude(height=text_depth)(text_2d)
        
        # Position the text
        x_pos = base_width / 2  # Center on x-axis
        y_pos = base_depth / 2  # Center on y-axis
        
        if text_position == 'bottom':
            # Position text on the bottom of the badge (as an engraving)
            z_pos = -text_depth
            self.text_model = translate([x_pos, y_pos, z_pos])(self.text_model)
        elif text_position == 'top':
            # Position text on the top of the badge
            base_height = self.params.get('base_height', 3)
            feature_height = self.params.get('feature_height', 10)  # Approximate
            z_pos = base_height + feature_height
            self.text_model = translate([x_pos, y_pos, z_pos])(self.text_model)
        elif text_position == 'front':
            # Position text on the front of the badge
            z_pos = self.params.get('base_height', 3) / 2
            y_pos = 0  # Front edge
            self.text_model = translate([x_pos, y_pos, z_pos])(
                rotate([90, 0, 0])(self.text_model)
            )
        
        return self.text_model


class TriangularBadge(Badge3DModel):
    """Triangular badge with stock data features."""
    
    def generate_base(self):
        """
        Generate a triangular base for the badge.
        
        Returns:
            solid.OpenSCADObject: Base 3D model
        """
        side_length = self.params.get('side_length', 80)
        height = self.params.get('base_height', 3)
        
        # Create an equilateral triangle
        points = [
            [0, 0],
            [side_length, 0],
            [side_length / 2, side_length * math.sin(math.radians(60))]
        ]
        
        triangle_2d = polygon(points)
        self.base_model = linear_extrude(height=height)(triangle_2d)
        return self.base_model
    
    def generate_feature(self):
        """
        Generate features on the badge based on stock data.
        
        Returns:
            solid.OpenSCADObject: Feature 3D model
        """
        feature_type = self.params.get('feature_type', 'pyramid')
        
        if feature_type == 'pyramid':
            self.feature_model = self._generate_pyramid()
        elif feature_type == 'terrain':
            self.feature_model = self._generate_terrain()
        else:
            logger.warning(f"Unknown feature type: {feature_type}, using pyramid")
            self.feature_model = self._generate_pyramid()
        
        return self.feature_model
    
    def _generate_pyramid(self):
        """
        Generate a pyramid feature with height based on stock data.
        
        Returns:
            solid.OpenSCADObject: Pyramid 3D model
        """
        side_length = self.params.get('side_length', 80)
        z_offset = self.params.get('base_height', 3)
        
        # Use the average of normalized close prices for the pyramid height
        pyramid_height = self.data['Close_Normalized'].mean() * 3
        
        # Create a pyramid (triangular prism)
        points = [
            [0, 0],
            [side_length, 0],
            [side_length / 2, side_length * math.sin(math.radians(60))]
        ]
        
        # Create the pyramid by scaling a series of triangles
        layers = 20  # Number of layers in the pyramid
        pyramid_parts = []
        
        for i in range(layers):
            # Calculate the scale factor for this layer
            scale_factor = 1.0 - (i / layers)
            layer_height = pyramid_height * (i / layers)
            
            # Scale the points for this layer
            scaled_points = [[p[0] * scale_factor, p[1] * scale_factor] for p in points]
            
            # Create the layer
            layer_2d = polygon(scaled_points)
            layer_3d = linear_extrude(height=pyramid_height/layers)(layer_2d)
            
            # Position the layer
            pyramid_parts.append(
                translate([
                    side_length * (1 - scale_factor) / 2,  # Center on x
                    side_length * (1 - scale_factor) / 4,  # Center on y
                    z_offset + layer_height
                ])(layer_3d)
            )
        
        return union()(pyramid_parts)
    
    def _generate_terrain(self):
        """
        Generate a terrain feature based on stock data.
        
        Returns:
            solid.OpenSCADObject: Terrain 3D model
        """
        side_length = self.params.get('side_length', 80)
        z_offset = self.params.get('base_height', 3)
        
        # Create a triangular grid
        grid_size = 10  # Number of divisions along each side
        
        # Calculate the height of the triangle
        triangle_height = side_length * math.sin(math.radians(60))
        
        # Calculate cell dimensions
        cell_width = side_length / grid_size
        cell_height = triangle_height / grid_size
        
        # Create cells for the terrain
        cells = []
        
        # Use stock data to determine cell heights
        # We'll cycle through the data if we need more points than we have
        data_len = len(self.data)
        
        cell_count = 0
        for i in range(grid_size):
            # Calculate the number of cells in this row
            row_cells = grid_size - i
            
            for j in range(row_cells):
                # Get the data index, cycling if necessary
                data_idx = cell_count % data_len
                cell_count += 1
                
                # Get the height for this cell
                terrain_height = self.data['Close_Normalized'].iloc[data_idx]
                
                # Calculate position
                x_pos = j * cell_width + (i * cell_width / 2)  # Offset each row
                y_pos = i * cell_height
                
                cells.append(
                    translate([x_pos, y_pos, z_offset])(
                        cube([cell_width * 0.95, cell_height * 0.95, terrain_height])
                    )
                )
        
        return union()(cells)
    
    def generate_text(self):
        """
        Generate text for the badge.
        
        Returns:
            solid.OpenSCADObject: Text 3D model
        """
        text_depth = self.params.get('text_depth', 2)
        text_size = self.params.get('text_size', 8)
        text_content = self.params.get('text_content', self.ticker_symbol)
        text_position = self.params.get('text_position', 'bottom')
        
        side_length = self.params.get('side_length', 80)
        
        # Create text object
        text_2d = text(text_content, size=text_size, halign='center', valign='center')
        self.text_model = linear_extrude(height=text_depth)(text_2d)
        
        # Position the text
        x_pos = side_length / 2  # Center on x-axis
        y_pos = side_length * math.sin(math.radians(60)) / 3  # Lower third of triangle
        
        if text_position == 'bottom':
            # Position text on the bottom of the badge (as an engraving)
            z_pos = -text_depth
            self.text_model = translate([x_pos, y_pos, z_pos])(self.text_model)
        elif text_position == 'top':
            # Position text on the top of the badge
            base_height = self.params.get('base_height', 3)
            feature_height = self.params.get('feature_height', 10)  # Approximate
            z_pos = base_height + feature_height
            self.text_model = translate([x_pos, y_pos, z_pos])(self.text_model)
        
        return self.text_model


class BadgeFactory:
    """Factory class for creating different types of badges."""
    
    @staticmethod
    def create_badge(badge_type, stock_data, ticker_symbol, params=None):
        """
        Create a badge of the specified type.
        
        Args:
            badge_type (str): Type of badge to create
            stock_data (pandas.DataFrame): Stock data
            ticker_symbol (str): Stock ticker symbol
            params (dict): Additional parameters for the badge
            
        Returns:
            Badge3DModel: Badge model instance
        """
        if badge_type == 'disc':
            return DiscBadge(stock_data, ticker_symbol, params)
        elif badge_type == 'rectangular':
            return RectangularBadge(stock_data, ticker_symbol, params)
        elif badge_type == 'triangular':
            return TriangularBadge(stock_data, ticker_symbol, params)
        else:
            logger.warning(f"Unknown badge type: {badge_type}, using disc")
            return DiscBadge(stock_data, ticker_symbol, params)


def main():
    """
    Main function for testing the module.
    """
    import argparse
    
    parser = argparse.ArgumentParser(description='Generate 3D badge models from stock data')
    parser.add_argument('--ticker', type=str, default='TSLA', help='Stock ticker symbol')
    parser.add_argument('--data-file', type=str, default='./stock_data', help='Stock data CSV file')
    parser.add_argument('--badge-type', type=str, default='disc', 
                       choices=['disc', 'rectangular', 'triangular'], help='Badge type')
    parser.add_argument('--feature-type', type=str, help='Feature type (depends on badge type)')
    parser.add_argument('--output', type=str, help='Output file name')
    args = parser.parse_args()
    
    try:
        # Load stock data
        if os.path.exists(args.data_file):
            stock_data = pd.read_csv(args.data_file)
            logger.info(f"Loaded stock data from {args.data_file}")
        else:
            logger.error(f"Data file not found: {args.data_file}")
            return 1
        
        # Set parameters based on badge type
        params = {}
        if args.feature_type:
            params['feature_type'] = args.feature_type
        
        # Create the badge
        badge = BadgeFactory.create_badge(args.badge_type, stock_data, args.ticker, params)
        
        # Generate the model
        badge.generate_base()
        badge.generate_feature()
        badge.generate_text()
        badge.combine_models()
        
        # Calculate and print statistics
        stats = badge.calculate_stats()
        print("\nModel Statistics:")
        for key, value in stats.items():
            print(f"  {key}: {value}")
        
        # Save the model
        output_file = args.output or f"{args.ticker}_{args.badge_type}_badge.scad"
        badge.save_to_file(output_file)
        print(f"\nModel saved to: {output_file}")
        
    except Exception as e:
        logger.error(f"Error in main function: {e}")
        print(f"Error: {str(e)}")
        return 1
    
    return 0


if __name__ == "__main__":
    import sys
    sys.exit(main())
 
 
************************************************/
